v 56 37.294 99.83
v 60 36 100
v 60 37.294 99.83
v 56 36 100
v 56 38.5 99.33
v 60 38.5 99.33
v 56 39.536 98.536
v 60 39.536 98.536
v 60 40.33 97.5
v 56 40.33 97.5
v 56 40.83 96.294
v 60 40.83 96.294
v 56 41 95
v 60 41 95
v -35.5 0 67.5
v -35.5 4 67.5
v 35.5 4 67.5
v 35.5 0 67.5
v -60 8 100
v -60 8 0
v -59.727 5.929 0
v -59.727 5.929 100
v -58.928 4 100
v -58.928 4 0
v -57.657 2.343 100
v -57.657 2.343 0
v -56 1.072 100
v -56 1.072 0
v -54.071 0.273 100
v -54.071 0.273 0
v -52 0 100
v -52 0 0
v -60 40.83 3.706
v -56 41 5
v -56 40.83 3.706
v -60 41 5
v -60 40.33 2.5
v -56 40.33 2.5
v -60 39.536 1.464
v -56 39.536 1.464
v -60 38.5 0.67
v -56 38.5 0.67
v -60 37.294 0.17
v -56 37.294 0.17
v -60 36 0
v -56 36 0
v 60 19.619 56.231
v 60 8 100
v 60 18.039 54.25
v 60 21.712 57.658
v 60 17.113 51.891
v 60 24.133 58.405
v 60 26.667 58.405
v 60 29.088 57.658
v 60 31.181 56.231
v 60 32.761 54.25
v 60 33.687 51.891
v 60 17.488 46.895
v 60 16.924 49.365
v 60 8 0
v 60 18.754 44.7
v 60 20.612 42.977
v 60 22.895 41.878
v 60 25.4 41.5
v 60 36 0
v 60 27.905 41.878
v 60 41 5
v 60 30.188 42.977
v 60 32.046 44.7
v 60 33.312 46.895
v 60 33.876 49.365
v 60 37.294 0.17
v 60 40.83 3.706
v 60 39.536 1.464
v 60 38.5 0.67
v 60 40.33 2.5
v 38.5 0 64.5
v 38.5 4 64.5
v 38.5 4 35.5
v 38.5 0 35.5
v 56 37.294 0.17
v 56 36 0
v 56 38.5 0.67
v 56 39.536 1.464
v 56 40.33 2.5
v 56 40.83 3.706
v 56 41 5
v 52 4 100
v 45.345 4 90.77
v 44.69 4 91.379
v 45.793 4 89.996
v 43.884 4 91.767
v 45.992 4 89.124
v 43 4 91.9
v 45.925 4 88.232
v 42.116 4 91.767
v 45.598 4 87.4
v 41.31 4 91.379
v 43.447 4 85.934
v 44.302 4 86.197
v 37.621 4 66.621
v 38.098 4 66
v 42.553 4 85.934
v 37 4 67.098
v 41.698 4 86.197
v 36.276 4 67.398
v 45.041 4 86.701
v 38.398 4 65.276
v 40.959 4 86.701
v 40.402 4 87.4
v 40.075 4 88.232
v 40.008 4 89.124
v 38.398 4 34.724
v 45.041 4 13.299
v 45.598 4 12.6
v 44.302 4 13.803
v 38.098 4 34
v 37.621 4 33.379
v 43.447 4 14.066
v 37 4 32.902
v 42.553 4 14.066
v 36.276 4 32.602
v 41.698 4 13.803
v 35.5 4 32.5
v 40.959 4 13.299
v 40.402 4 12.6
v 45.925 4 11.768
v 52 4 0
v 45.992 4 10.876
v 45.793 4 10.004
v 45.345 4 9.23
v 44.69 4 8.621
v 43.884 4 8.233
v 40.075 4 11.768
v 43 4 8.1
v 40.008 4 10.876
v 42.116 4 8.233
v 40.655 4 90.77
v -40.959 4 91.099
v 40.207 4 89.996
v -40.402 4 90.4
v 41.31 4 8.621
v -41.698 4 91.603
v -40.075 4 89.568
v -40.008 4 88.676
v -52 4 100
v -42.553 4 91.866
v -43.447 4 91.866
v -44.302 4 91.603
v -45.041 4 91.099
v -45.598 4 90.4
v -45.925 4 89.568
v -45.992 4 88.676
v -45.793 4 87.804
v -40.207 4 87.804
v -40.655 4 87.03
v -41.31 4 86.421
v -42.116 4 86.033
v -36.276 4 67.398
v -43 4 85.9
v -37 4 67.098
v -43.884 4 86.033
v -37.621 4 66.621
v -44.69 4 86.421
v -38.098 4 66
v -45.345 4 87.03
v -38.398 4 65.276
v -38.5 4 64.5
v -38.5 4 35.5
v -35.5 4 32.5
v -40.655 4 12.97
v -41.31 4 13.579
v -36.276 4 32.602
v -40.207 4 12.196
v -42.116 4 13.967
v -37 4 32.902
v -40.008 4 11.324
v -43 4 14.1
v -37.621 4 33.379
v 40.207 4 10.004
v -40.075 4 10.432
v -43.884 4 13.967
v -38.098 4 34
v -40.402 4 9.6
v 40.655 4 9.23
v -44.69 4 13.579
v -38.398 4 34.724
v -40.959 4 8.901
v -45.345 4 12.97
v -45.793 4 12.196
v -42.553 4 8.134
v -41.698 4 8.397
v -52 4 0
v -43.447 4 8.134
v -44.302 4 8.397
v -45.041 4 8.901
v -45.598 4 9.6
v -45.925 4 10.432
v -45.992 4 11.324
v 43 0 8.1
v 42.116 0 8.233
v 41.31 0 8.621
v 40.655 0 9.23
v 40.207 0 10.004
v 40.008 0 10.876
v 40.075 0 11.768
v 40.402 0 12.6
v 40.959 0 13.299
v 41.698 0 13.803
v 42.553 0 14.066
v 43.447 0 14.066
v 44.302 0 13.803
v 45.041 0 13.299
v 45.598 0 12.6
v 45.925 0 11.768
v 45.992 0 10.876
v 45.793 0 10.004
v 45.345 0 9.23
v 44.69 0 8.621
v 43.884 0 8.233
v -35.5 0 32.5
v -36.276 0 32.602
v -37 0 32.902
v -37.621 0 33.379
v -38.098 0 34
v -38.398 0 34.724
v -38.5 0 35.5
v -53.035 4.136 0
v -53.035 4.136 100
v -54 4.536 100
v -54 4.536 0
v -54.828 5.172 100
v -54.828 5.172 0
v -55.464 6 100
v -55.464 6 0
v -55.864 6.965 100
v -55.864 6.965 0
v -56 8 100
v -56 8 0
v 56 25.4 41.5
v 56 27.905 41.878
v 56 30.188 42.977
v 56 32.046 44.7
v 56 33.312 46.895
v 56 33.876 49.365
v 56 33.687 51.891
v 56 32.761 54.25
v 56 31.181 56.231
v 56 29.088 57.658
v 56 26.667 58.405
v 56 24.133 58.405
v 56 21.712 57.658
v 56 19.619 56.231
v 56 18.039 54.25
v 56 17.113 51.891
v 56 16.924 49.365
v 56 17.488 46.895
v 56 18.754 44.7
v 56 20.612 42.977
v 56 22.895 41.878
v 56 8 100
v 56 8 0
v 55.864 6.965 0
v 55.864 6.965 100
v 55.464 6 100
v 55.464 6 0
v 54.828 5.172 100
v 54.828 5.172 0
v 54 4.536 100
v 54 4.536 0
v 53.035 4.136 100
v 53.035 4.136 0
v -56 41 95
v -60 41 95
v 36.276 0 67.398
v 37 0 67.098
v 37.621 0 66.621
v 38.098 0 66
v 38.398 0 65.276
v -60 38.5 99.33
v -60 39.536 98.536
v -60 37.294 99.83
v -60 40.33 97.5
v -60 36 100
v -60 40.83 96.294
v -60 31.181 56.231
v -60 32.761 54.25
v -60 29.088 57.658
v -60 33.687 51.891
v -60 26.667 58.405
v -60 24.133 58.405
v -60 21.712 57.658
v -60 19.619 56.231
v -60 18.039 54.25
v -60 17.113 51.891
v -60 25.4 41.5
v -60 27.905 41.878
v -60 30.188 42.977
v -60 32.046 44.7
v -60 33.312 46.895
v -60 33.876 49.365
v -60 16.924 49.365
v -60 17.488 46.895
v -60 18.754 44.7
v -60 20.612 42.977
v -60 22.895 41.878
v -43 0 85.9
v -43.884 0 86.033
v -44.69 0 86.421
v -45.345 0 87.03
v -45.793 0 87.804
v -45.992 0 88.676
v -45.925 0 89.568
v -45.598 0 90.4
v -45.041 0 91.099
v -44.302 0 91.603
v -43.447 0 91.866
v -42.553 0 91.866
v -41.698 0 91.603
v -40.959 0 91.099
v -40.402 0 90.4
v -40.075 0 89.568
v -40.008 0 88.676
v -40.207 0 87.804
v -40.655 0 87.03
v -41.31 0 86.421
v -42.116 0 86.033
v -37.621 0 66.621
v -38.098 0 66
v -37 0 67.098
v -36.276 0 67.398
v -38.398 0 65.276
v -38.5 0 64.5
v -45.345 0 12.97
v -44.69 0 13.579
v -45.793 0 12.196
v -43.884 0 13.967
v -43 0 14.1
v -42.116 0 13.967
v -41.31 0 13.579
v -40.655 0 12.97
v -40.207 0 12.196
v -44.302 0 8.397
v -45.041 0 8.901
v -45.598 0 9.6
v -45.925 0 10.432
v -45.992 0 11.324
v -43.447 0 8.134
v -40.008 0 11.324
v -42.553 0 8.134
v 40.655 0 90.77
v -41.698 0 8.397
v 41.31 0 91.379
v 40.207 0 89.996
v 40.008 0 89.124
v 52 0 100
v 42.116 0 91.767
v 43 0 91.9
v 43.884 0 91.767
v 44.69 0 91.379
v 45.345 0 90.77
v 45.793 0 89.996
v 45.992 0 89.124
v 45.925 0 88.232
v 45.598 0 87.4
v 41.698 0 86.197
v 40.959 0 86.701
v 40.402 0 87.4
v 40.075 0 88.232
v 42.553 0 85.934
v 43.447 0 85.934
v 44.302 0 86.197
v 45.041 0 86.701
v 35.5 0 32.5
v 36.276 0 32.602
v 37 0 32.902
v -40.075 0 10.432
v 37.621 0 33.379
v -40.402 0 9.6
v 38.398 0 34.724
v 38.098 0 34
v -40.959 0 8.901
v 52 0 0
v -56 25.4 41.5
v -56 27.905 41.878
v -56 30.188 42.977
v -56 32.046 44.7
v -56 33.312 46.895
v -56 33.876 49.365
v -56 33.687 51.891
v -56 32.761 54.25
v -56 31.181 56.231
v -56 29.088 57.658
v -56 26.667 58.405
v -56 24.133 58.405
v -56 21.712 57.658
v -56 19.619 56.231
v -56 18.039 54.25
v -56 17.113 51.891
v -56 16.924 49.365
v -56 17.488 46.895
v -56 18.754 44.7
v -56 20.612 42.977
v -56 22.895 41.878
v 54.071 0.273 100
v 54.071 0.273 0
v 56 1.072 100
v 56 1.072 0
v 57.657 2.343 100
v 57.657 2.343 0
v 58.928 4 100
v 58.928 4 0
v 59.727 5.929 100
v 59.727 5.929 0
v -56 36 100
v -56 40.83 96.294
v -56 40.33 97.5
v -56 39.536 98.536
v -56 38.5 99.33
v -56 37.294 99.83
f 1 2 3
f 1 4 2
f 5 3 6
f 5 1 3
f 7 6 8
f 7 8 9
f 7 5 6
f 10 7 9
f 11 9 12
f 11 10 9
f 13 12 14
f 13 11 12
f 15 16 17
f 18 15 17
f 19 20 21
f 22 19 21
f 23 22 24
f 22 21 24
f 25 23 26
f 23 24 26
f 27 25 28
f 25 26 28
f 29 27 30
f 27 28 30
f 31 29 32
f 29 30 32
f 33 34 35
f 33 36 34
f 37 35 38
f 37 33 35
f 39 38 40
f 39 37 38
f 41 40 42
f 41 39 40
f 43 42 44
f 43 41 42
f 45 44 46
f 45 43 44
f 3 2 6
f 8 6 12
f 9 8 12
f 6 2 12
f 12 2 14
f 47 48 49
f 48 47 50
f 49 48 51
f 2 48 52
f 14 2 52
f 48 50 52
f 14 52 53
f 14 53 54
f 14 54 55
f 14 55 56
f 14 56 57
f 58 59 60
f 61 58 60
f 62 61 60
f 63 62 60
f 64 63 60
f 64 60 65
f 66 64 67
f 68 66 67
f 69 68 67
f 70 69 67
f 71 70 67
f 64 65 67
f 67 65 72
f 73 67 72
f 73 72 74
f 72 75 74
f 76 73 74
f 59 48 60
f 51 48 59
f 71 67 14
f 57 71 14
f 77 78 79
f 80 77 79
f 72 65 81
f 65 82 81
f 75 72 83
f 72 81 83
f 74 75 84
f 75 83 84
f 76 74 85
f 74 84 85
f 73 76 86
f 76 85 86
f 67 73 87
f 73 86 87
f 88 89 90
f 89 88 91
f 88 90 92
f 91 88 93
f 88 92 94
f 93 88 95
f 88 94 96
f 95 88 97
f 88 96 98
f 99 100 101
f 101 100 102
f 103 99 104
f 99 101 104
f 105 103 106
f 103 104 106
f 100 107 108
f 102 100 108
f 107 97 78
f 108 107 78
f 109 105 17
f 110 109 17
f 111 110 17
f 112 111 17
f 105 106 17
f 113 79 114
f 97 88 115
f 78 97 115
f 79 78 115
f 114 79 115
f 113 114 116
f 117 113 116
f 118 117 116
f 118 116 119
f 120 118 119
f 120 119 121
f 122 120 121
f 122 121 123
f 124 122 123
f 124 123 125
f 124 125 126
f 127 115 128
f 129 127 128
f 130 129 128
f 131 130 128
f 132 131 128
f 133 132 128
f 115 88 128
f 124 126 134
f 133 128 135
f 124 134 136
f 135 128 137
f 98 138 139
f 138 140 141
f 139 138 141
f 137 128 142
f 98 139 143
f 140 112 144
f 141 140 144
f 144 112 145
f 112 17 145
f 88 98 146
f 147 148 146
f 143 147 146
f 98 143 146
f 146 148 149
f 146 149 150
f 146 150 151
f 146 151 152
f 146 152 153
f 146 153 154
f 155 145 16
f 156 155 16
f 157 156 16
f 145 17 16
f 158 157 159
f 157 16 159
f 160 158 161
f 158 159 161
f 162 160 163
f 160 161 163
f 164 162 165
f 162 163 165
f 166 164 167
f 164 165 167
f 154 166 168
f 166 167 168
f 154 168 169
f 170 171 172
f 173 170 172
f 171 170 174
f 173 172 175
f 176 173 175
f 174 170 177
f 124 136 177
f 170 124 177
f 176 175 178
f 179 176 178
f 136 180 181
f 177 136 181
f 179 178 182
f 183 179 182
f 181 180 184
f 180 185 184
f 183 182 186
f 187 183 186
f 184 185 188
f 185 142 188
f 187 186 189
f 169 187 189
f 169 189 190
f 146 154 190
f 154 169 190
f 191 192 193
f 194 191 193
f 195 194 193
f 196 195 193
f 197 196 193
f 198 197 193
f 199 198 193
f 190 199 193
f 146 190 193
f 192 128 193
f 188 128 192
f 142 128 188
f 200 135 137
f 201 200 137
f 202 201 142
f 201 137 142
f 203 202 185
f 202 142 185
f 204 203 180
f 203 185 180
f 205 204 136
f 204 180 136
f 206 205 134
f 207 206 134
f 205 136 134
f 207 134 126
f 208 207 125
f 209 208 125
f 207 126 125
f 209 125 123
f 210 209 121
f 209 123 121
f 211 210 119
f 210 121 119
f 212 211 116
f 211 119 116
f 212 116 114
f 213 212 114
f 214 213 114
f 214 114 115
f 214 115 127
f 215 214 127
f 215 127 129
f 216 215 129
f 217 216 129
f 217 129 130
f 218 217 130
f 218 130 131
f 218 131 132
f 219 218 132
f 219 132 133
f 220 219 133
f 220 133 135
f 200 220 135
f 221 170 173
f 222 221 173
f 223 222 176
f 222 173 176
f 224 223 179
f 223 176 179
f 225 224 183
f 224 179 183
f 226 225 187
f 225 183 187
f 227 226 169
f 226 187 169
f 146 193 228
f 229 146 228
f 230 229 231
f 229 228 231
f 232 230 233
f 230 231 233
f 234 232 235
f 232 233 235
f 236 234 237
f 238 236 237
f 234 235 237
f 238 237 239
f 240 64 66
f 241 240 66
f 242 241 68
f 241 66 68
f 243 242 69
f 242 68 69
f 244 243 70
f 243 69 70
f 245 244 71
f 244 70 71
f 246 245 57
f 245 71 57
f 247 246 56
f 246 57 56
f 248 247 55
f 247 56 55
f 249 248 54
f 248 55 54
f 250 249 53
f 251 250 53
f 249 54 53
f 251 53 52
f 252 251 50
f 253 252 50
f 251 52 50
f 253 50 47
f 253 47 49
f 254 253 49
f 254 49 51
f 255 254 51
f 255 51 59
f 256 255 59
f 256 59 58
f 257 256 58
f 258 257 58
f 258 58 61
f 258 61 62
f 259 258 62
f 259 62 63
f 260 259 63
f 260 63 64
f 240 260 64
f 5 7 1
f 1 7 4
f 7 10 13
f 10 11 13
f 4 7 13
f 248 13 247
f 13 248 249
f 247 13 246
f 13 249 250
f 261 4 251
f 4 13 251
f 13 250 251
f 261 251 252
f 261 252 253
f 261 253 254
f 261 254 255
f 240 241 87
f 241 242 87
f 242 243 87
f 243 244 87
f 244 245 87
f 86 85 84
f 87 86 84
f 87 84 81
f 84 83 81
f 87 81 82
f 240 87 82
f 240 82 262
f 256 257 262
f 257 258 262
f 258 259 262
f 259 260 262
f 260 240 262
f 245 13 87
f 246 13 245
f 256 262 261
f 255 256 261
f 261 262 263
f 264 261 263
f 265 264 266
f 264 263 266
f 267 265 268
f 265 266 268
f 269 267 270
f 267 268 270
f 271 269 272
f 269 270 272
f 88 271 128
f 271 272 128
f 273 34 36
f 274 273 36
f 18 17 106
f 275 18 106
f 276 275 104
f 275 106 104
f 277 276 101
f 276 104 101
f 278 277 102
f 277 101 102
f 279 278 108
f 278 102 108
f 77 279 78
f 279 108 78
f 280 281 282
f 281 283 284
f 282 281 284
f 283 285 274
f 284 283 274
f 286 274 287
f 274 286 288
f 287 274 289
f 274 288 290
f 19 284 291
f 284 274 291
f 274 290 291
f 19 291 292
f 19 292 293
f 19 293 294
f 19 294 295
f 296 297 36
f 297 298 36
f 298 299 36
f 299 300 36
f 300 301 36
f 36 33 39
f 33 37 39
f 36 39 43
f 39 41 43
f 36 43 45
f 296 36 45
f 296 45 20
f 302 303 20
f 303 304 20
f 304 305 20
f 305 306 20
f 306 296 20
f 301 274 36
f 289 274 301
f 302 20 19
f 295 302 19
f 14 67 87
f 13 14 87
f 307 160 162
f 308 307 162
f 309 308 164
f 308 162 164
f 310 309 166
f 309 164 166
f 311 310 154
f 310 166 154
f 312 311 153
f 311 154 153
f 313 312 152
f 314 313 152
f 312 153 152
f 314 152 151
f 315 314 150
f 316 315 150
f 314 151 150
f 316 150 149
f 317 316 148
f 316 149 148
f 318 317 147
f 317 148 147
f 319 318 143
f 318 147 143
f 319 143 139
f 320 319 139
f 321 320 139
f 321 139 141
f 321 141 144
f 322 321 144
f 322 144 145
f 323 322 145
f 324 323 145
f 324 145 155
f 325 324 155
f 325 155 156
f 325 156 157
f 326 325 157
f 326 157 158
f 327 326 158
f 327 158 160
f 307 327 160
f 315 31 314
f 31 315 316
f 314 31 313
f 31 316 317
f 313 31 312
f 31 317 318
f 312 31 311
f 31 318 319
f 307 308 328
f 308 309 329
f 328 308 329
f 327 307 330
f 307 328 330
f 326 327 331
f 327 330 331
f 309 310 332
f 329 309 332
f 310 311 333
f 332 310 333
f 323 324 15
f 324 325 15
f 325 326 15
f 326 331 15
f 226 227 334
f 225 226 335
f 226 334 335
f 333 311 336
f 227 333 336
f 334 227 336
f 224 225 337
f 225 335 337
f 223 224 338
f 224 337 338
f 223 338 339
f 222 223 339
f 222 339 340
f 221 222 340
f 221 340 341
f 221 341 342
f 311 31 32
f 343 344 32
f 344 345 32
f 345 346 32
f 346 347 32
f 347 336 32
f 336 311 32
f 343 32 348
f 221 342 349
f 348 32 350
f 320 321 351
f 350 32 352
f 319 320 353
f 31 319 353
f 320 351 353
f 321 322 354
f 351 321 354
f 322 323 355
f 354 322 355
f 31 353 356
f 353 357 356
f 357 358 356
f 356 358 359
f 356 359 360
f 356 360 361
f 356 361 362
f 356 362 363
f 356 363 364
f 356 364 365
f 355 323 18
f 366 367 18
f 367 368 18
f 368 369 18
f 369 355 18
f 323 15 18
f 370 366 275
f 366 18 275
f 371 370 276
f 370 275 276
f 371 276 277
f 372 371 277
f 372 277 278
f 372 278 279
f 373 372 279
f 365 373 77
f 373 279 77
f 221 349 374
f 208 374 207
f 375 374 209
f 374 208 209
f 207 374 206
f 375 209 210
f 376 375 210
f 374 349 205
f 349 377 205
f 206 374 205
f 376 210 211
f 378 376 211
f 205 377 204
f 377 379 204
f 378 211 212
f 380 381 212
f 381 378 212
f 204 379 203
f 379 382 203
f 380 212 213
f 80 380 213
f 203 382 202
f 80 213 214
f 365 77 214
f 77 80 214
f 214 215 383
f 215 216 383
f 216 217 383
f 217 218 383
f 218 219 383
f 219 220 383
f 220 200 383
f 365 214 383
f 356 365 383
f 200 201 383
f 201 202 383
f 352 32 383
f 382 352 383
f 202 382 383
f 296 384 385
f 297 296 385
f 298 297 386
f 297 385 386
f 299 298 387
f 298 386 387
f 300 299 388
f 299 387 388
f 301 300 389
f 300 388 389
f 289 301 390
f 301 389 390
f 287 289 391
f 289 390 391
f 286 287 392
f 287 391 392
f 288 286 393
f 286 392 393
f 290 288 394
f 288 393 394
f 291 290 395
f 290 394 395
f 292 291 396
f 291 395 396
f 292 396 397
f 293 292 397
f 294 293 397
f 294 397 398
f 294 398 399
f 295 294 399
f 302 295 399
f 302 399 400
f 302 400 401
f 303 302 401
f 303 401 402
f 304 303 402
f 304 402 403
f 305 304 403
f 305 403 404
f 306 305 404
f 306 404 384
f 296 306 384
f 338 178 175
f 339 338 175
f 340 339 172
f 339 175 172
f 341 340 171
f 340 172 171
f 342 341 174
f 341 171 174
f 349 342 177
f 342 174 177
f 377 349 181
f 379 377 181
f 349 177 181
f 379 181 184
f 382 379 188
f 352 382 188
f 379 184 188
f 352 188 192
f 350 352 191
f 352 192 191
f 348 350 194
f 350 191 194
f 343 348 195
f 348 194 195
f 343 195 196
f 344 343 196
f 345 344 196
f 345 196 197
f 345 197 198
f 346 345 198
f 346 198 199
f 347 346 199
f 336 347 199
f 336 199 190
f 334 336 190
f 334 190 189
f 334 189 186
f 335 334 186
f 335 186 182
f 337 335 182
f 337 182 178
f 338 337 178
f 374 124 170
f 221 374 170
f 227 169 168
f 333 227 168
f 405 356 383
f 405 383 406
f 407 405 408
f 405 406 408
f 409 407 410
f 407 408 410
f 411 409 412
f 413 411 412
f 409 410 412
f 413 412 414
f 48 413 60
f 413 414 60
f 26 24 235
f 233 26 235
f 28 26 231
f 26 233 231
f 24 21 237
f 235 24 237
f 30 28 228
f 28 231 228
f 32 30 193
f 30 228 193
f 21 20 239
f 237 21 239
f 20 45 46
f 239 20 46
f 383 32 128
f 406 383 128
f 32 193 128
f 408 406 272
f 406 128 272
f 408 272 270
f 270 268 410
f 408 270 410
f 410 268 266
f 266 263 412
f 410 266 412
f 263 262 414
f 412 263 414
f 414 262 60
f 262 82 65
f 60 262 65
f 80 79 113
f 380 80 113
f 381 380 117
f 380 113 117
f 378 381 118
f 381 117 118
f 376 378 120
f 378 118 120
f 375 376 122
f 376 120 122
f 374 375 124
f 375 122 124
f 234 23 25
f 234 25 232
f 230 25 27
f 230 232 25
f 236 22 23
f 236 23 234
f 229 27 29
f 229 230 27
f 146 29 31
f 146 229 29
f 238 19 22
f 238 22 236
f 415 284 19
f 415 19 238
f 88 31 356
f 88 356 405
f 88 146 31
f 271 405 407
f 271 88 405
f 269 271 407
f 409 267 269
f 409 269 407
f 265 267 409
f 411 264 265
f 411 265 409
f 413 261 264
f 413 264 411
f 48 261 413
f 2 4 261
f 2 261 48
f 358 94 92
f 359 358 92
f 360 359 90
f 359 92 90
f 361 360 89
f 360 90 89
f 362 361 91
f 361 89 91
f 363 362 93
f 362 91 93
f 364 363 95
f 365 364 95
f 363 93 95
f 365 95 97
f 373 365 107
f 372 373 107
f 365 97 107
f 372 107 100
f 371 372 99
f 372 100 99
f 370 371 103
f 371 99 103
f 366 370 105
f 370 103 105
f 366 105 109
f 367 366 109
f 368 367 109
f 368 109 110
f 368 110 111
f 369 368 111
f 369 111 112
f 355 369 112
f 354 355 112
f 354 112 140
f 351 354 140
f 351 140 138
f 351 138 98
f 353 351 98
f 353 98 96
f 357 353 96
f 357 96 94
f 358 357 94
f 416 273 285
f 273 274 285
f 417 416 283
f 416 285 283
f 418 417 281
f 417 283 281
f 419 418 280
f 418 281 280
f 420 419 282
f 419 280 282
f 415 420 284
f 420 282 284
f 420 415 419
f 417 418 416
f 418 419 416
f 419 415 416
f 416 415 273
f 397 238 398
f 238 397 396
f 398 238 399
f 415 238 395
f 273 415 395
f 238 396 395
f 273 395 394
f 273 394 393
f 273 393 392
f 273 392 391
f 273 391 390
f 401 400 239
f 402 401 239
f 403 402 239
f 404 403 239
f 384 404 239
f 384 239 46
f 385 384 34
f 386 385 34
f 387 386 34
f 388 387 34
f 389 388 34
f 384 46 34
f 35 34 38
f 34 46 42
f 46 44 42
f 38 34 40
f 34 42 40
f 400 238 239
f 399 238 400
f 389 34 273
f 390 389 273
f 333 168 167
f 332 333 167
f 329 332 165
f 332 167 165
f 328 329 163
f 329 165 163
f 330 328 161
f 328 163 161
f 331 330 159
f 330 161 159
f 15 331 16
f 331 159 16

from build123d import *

# Parameters (mm, degrees)
BASE_FLANGE1_DEPTH = 100
CUT_EXTRUDE1_REACH = 163.496
SKETCH6_R          = 8.5
CUT_EXTRUDE2_REACH = 124.348
SKETCH7_R          = 3
FILLET1_R          = 5


# Sheet-metal steps are written as plain solids
with BuildPart() as part:
    # Sketch1 → Base-Flange1 (new body)
    with BuildSketch(Plane.XY):
        with BuildLine():
            Line((-60, 41), (-60, 8))
            ThreePointArc((-60, 8), (-57.656854249, 2.343145751), (-52, 0))
            Line((-52, 0), (52, 0))
            ThreePointArc((52, 0), (57.656854249, 2.343145751), (60, 8))
            Line((60, 8), (60, 41))
            Line((60, 41), (56, 41))
            Line((56, 41), (56, 8))
            ThreePointArc((56, 8), (54.828427125, 5.171572875), (52, 4))
            Line((52, 4), (-52, 4))
            ThreePointArc((-52, 4), (-54.828427125, 5.171572875), (-56, 8))
            Line((-56, 8), (-56, 41))
            Line((-56, 41), (-60, 41))
        make_face()
    extrude(amount=BASE_FLANGE1_DEPTH)

    # Cut-Extrude1: up to this face of the body (flat: up to its plane)
    cut_extrude1_end = Plane(part.part.faces().sort_by_distance((-60, 24.5, 50))[0])
    # Sketch6 → Cut-Extrude1 (cut, up to the picked face)
    with BuildSketch(Plane(origin=(60, 0, 0), x_dir=(0, 0, -1), z_dir=(1, 0, 0)), mode=Mode.PRIVATE) as cut_extrude1_sk1:
        with Locations((-50, 25.4)):
            Circle(SKETCH6_R)
    cut_extrude1_tool1 = split(extrude(cut_extrude1_sk1.sketch, amount=-CUT_EXTRUDE1_REACH, mode=Mode.PRIVATE), bisect_by=cut_extrude1_end, keep=Keep.BOTH, mode=Mode.PRIVATE)
    add(cut_extrude1_tool1.solids().sort_by(Axis((60, 25.4, 50), (-1, 0, 0)))[0], mode=Mode.SUBTRACT)

    # Sketch7 → Cut-Extrude2 (cut, up to next)
    with BuildSketch(Plane(origin=(0, 4, 0), x_dir=(1, 0, 0), z_dir=(0, 1, 0)), mode=Mode.PRIVATE) as cut_extrude2_sk1:
        with Locations(Location((-43, -11.1, 0), (0, 0, 270))):
            Circle(SKETCH7_R)
    cut_extrude2_tool1 = extrude(cut_extrude2_sk1.sketch, amount=-CUT_EXTRUDE2_REACH, mode=Mode.PRIVATE) & part.part
    # Sketch7 → Cut-Extrude2 (cut, up to next)
    with BuildSketch(Plane(origin=(0, 4, 0), x_dir=(1, 0, 0), z_dir=(0, 1, 0)), mode=Mode.PRIVATE) as cut_extrude2_sk2:
        with Locations(Location((43, -11.1, 0), (0, 0, 90))):
            Circle(SKETCH7_R)
    cut_extrude2_tool2 = extrude(cut_extrude2_sk2.sketch, amount=-CUT_EXTRUDE2_REACH, mode=Mode.PRIVATE) & part.part
    # Sketch7 → Cut-Extrude2 (cut, up to next)
    with BuildSketch(Plane(origin=(0, 4, 0), x_dir=(1, 0, 0), z_dir=(0, 1, 0)), mode=Mode.PRIVATE) as cut_extrude2_sk3:
        with Locations(Location((-43, -88.9, 0), (0, 0, 90))):
            Circle(SKETCH7_R)
    cut_extrude2_tool3 = extrude(cut_extrude2_sk3.sketch, amount=-CUT_EXTRUDE2_REACH, mode=Mode.PRIVATE) & part.part
    # Sketch7 → Cut-Extrude2 (cut, up to next)
    with BuildSketch(Plane(origin=(0, 4, 0), x_dir=(1, 0, 0), z_dir=(0, 1, 0)), mode=Mode.PRIVATE) as cut_extrude2_sk4:
        with Locations(Location((43, -88.9, 0), (0, 0, 270))):
            Circle(SKETCH7_R)
    cut_extrude2_tool4 = extrude(cut_extrude2_sk4.sketch, amount=-CUT_EXTRUDE2_REACH, mode=Mode.PRIVATE) & part.part
    # Sketch7 → Cut-Extrude2 (cut, up to next)
    with BuildSketch(Plane(origin=(0, 4, 0), x_dir=(1, 0, 0), z_dir=(0, 1, 0)), mode=Mode.PRIVATE) as cut_extrude2_sk5:
        with BuildLine():
            Line((-35.5, -67.5), (35.5, -67.5))
            ThreePointArc((35.5, -67.5), (37.621320344, -66.621320344), (38.5, -64.5))
            Line((38.5, -64.5), (38.5, -35.5))
            ThreePointArc((38.5, -35.5), (37.621320344, -33.378679656), (35.5, -32.5))
            Line((35.5, -32.5), (-35.5, -32.5))
            ThreePointArc((-35.5, -32.5), (-37.621320344, -33.378679656), (-38.5, -35.5))
            Line((-38.5, -35.5), (-38.5, -64.5))
            ThreePointArc((-38.5, -64.5), (-37.621320344, -66.621320344), (-35.5, -67.5))
        make_face()
    cut_extrude2_tool5 = extrude(cut_extrude2_sk5.sketch, amount=-CUT_EXTRUDE2_REACH, mode=Mode.PRIVATE) & part.part
    add(cut_extrude2_tool1.solids().sort_by_distance((-43, 4, 11.1))[0], mode=Mode.SUBTRACT)
    add(cut_extrude2_tool2.solids().sort_by_distance((43, 4, 11.1))[0], mode=Mode.SUBTRACT)
    add(cut_extrude2_tool3.solids().sort_by_distance((-43, 4, 88.9))[0], mode=Mode.SUBTRACT)
    add(cut_extrude2_tool4.solids().sort_by_distance((43, 4, 88.9))[0], mode=Mode.SUBTRACT)
    add(cut_extrude2_tool5.solids().sort_by_distance((0, 4, 50))[0], mode=Mode.SUBTRACT)

    # Fillet1
    fillet1_edges = [part.edges().sort_by_distance(p)[0] for p in [
        (58, 41, 0),
        (-58, 41, 0),
        (58, 41, 100),
        (-58, 41, 100),
    ]]
    fillet(fillet1_edges, radius=FILLET1_R)


solid = part.part
